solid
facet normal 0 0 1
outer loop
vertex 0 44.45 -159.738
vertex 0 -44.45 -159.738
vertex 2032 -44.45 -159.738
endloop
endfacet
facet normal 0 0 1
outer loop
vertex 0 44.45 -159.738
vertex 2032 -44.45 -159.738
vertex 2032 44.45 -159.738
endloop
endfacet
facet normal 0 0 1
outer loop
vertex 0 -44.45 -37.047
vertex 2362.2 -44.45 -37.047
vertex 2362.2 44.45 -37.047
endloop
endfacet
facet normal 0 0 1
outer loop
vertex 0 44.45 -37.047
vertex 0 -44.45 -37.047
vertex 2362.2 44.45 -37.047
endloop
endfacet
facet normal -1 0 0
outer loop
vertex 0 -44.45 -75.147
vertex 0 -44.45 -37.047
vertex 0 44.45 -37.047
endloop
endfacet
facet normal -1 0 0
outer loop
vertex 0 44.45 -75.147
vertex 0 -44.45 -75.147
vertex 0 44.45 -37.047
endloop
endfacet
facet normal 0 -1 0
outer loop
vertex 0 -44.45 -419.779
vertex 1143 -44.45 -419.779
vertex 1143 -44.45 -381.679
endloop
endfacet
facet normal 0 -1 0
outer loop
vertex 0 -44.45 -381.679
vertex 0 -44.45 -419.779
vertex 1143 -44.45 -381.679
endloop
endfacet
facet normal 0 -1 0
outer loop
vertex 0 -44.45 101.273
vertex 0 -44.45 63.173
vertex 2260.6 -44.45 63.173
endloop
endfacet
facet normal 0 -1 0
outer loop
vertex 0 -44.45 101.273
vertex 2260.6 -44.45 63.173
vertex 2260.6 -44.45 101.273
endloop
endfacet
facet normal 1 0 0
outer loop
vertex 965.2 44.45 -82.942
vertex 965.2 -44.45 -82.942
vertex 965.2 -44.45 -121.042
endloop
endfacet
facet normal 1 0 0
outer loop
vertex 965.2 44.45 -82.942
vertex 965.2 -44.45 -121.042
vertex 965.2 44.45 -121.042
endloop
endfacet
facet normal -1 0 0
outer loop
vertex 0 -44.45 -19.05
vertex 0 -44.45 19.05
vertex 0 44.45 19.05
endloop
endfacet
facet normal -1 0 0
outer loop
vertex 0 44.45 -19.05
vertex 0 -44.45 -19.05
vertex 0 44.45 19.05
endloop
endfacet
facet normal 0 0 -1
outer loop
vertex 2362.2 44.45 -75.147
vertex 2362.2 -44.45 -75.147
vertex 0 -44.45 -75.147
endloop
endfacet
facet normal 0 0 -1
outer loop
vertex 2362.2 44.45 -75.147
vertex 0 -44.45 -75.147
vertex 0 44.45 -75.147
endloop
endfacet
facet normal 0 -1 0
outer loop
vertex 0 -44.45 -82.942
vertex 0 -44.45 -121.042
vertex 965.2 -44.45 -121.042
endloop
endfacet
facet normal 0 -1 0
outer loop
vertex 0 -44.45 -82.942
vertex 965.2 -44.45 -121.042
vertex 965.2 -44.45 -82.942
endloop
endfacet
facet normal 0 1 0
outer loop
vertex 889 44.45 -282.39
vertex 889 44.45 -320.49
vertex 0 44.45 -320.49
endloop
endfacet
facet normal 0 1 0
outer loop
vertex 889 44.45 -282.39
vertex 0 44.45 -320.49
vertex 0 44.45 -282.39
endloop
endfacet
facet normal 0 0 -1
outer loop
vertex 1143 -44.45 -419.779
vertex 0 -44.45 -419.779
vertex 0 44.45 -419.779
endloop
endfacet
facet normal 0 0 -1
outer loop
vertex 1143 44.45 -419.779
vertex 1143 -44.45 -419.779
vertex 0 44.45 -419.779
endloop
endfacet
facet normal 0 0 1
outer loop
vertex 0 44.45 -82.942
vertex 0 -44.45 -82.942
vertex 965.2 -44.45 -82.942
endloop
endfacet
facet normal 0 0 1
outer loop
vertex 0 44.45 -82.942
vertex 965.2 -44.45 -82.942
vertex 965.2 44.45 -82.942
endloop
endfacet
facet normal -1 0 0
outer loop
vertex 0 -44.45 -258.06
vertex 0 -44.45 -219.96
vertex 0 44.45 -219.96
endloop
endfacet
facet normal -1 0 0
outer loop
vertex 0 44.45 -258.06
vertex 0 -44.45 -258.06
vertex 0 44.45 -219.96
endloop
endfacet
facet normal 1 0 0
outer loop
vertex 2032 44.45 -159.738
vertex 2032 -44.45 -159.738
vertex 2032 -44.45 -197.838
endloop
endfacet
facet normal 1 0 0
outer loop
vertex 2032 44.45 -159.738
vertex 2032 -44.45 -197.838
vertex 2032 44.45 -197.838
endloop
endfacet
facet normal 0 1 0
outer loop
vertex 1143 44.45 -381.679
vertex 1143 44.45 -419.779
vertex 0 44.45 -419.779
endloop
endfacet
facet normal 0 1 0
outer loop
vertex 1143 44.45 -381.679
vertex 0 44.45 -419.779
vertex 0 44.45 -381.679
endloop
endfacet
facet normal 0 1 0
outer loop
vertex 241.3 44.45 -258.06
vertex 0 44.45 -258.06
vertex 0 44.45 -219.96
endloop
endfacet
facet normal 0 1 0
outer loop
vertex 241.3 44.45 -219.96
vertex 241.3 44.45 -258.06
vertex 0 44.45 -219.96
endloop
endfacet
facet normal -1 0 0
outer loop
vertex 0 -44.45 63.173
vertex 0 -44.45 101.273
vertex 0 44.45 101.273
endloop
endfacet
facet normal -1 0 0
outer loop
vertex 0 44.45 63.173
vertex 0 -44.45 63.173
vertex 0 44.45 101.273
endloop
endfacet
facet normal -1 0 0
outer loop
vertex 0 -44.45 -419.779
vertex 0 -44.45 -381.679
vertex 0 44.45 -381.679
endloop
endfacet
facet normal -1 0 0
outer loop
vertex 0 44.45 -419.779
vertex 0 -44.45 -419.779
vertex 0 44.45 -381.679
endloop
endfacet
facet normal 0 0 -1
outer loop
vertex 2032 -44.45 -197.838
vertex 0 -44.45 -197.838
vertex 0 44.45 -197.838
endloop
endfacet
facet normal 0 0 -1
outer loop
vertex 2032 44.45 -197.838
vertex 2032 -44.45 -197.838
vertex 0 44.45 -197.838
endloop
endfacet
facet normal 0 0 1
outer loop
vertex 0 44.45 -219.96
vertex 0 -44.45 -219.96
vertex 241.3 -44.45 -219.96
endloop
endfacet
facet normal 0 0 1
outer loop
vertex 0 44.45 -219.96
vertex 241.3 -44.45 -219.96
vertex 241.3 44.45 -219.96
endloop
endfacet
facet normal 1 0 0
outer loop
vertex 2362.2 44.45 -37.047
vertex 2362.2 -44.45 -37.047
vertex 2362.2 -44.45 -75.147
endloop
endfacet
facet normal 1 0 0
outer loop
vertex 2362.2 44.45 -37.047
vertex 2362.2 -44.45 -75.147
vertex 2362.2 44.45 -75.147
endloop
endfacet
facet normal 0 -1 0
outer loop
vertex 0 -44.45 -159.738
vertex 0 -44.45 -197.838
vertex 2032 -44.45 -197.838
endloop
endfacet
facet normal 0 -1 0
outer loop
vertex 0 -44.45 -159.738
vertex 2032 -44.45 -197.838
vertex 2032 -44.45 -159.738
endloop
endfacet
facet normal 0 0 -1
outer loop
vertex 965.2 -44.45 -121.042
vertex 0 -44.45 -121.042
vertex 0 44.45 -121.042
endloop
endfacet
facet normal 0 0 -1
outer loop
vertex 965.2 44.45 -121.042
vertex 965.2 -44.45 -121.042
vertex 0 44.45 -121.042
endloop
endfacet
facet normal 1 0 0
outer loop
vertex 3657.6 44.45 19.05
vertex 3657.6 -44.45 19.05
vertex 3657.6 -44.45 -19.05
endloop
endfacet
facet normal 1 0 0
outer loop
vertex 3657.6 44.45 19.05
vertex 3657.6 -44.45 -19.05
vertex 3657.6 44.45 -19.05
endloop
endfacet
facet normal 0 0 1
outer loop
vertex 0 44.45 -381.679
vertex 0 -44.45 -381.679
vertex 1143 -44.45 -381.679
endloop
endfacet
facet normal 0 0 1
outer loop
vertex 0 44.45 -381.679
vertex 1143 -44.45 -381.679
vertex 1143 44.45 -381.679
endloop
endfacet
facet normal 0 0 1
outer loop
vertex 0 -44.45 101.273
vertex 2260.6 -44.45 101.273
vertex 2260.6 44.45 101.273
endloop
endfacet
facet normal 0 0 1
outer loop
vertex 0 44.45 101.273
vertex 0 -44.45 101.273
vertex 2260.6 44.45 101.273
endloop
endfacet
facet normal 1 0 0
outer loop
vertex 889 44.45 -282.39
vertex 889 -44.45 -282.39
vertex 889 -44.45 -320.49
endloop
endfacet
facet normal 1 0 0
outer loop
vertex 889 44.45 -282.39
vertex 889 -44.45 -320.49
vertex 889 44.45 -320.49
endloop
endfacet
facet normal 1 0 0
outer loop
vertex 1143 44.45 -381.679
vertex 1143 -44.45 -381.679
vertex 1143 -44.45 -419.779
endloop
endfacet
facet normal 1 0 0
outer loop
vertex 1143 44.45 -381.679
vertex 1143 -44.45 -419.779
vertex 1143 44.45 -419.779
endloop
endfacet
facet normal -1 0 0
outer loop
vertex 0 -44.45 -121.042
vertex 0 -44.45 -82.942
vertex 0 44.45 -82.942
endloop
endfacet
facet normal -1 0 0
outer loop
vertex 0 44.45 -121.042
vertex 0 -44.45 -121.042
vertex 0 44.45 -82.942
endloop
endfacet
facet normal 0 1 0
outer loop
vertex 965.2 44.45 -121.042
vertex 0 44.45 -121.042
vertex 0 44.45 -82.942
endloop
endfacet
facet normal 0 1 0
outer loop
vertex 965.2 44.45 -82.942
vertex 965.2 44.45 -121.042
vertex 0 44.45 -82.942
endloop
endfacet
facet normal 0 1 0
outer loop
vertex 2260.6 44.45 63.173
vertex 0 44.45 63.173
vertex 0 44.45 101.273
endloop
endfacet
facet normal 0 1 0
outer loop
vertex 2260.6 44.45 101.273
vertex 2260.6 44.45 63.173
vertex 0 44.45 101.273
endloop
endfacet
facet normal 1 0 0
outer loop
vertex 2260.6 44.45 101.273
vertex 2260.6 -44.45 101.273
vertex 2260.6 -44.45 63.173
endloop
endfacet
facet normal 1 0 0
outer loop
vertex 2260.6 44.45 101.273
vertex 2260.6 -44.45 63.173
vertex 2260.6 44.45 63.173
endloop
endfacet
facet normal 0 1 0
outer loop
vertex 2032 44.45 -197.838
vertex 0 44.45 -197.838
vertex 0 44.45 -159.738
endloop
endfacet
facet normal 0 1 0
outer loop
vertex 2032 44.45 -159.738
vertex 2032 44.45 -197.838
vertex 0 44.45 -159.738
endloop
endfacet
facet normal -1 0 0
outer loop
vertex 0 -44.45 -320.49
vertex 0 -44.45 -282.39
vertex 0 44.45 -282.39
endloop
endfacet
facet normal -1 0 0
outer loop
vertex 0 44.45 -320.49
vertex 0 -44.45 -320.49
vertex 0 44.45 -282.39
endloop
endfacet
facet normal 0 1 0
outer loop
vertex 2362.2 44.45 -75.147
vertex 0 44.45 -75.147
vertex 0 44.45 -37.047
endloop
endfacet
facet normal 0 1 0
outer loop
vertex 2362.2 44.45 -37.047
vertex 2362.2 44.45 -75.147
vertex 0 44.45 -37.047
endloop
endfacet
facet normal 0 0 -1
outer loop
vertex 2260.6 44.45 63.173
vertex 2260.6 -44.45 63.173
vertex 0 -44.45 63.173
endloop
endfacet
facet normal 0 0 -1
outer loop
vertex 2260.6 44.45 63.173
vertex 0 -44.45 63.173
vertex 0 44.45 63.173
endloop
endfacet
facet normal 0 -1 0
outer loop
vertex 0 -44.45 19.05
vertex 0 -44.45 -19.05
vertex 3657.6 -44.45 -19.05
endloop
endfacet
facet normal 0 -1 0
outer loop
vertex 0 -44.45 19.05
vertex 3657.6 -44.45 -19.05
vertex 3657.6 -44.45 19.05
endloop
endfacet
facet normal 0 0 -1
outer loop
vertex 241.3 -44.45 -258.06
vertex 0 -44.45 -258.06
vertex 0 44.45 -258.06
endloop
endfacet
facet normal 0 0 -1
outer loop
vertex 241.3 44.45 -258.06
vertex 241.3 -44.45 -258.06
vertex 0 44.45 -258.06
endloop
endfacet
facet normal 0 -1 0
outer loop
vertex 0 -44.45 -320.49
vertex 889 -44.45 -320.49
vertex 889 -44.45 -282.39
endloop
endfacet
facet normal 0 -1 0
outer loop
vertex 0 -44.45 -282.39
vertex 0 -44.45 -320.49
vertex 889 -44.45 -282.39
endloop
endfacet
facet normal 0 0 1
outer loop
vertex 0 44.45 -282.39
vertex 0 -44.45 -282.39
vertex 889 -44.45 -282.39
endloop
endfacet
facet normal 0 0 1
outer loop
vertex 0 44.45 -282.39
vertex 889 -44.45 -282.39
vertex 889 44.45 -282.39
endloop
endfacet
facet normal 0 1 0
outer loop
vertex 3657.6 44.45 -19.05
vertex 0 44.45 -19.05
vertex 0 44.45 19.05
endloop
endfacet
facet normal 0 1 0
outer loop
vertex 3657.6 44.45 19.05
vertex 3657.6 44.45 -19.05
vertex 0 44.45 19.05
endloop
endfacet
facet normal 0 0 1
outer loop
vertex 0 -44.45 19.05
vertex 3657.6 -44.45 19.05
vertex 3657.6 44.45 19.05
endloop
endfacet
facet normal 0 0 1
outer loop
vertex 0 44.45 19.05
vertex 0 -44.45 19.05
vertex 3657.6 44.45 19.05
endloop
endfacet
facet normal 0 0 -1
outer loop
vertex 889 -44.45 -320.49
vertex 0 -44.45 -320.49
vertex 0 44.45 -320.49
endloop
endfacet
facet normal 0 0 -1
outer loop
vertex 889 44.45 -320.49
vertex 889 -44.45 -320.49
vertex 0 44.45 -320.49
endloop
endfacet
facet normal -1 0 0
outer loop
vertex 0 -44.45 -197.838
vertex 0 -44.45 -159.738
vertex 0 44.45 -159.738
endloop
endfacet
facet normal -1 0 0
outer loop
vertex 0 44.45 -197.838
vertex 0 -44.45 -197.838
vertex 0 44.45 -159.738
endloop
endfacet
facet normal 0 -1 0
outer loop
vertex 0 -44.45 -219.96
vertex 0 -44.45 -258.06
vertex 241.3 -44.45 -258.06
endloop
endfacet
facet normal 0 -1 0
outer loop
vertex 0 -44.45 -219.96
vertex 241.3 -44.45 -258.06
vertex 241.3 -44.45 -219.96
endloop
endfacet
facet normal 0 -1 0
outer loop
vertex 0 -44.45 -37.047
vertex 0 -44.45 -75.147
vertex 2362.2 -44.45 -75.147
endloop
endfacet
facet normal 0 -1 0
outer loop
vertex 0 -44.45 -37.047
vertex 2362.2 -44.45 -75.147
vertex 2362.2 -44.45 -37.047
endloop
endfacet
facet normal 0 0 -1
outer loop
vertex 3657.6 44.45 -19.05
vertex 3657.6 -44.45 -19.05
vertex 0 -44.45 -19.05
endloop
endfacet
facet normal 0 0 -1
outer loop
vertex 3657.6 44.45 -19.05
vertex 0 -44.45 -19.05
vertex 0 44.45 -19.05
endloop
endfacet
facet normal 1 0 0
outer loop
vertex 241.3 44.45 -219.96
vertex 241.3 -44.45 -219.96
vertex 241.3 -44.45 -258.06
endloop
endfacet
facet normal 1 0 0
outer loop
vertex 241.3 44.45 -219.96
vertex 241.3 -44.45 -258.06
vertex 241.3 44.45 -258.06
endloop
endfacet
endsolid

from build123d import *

# Parameters (mm, degrees)
F0_W      = 88.9
F0_H      = 38.1
F1_DEPTH  = 3657.6
F4_W      = 88.9
F4_H      = 38.1
F5_DEPTH  = 2362.2
F6_W      = 88.9
F6_H      = 38.1
F7_DEPTH  = 2260.6
F8_W      = 88.9
F8_H      = 38.1
F9_DEPTH  = 965.2
F10_W     = 88.9
F10_H     = 38.1
F11_DEPTH = 2032
F12_W     = 88.9
F12_H     = 38.1
F13_DEPTH = 241.3
F14_W     = 88.9
F14_H     = 38.1
F15_DEPTH = 889
F16_W     = 88.9
F16_H     = 38.1
F17_DEPTH = 1143


with BuildPart() as f1:
    # F0 (on Right) → F1 (new body)
    with BuildSketch(Plane.YZ):
        Rectangle(F0_W, F0_H)
    extrude(amount=F1_DEPTH)


with BuildPart() as f2_1:
    # F2: copy of F1
    add(f1.part.moved(Location((0, 0, 52.832))))


with BuildPart() as f5:
    # F4 (on Right) → F5 (new body)
    with BuildSketch(Plane.YZ):
        with Locations((0, -56.097239)):
            Rectangle(F4_W, F4_H)
    extrude(amount=F5_DEPTH)


with BuildPart() as f7:
    # F6 (on Right) → F7 (new body)
    with BuildSketch(Plane.YZ):
        with Locations((0, 82.222956)):
            Rectangle(F6_W, F6_H)
    extrude(amount=F7_DEPTH)


with BuildPart() as f9:
    # F8 (on Right) → F9 (new body)
    with BuildSketch(Plane.YZ):
        with Locations((0, -101.991609)):
            Rectangle(F8_W, F8_H)
    extrude(amount=F9_DEPTH)


with BuildPart() as f11:
    # F10 (on Right) → F11 (new body)
    with BuildSketch(Plane.YZ):
        with Locations((0, -178.788379)):
            Rectangle(F10_W, F10_H)
    extrude(amount=F11_DEPTH)


with BuildPart() as f13:
    # F12 (on Right) → F13 (new body)
    with BuildSketch(Plane.YZ):
        with Locations((0, -239.009604)):
            Rectangle(F12_W, F12_H)
    extrude(amount=F13_DEPTH)


with BuildPart() as f15:
    # F14 (on Right) → F15 (new body)
    with BuildSketch(Plane.YZ):
        with Locations((0, -301.439553)):
            Rectangle(F14_W, F14_H)
    extrude(amount=F15_DEPTH)


with BuildPart() as f17:
    # F16 (on Right) → F17 (new body)
    with BuildSketch(Plane.YZ):
        with Locations((0, -400.728822)):
            Rectangle(F16_W, F16_H)
    extrude(amount=F17_DEPTH)


solid = Compound([f1.part, f5.part, f7.part, f9.part, f11.part, f13.part, f15.part, f17.part])
